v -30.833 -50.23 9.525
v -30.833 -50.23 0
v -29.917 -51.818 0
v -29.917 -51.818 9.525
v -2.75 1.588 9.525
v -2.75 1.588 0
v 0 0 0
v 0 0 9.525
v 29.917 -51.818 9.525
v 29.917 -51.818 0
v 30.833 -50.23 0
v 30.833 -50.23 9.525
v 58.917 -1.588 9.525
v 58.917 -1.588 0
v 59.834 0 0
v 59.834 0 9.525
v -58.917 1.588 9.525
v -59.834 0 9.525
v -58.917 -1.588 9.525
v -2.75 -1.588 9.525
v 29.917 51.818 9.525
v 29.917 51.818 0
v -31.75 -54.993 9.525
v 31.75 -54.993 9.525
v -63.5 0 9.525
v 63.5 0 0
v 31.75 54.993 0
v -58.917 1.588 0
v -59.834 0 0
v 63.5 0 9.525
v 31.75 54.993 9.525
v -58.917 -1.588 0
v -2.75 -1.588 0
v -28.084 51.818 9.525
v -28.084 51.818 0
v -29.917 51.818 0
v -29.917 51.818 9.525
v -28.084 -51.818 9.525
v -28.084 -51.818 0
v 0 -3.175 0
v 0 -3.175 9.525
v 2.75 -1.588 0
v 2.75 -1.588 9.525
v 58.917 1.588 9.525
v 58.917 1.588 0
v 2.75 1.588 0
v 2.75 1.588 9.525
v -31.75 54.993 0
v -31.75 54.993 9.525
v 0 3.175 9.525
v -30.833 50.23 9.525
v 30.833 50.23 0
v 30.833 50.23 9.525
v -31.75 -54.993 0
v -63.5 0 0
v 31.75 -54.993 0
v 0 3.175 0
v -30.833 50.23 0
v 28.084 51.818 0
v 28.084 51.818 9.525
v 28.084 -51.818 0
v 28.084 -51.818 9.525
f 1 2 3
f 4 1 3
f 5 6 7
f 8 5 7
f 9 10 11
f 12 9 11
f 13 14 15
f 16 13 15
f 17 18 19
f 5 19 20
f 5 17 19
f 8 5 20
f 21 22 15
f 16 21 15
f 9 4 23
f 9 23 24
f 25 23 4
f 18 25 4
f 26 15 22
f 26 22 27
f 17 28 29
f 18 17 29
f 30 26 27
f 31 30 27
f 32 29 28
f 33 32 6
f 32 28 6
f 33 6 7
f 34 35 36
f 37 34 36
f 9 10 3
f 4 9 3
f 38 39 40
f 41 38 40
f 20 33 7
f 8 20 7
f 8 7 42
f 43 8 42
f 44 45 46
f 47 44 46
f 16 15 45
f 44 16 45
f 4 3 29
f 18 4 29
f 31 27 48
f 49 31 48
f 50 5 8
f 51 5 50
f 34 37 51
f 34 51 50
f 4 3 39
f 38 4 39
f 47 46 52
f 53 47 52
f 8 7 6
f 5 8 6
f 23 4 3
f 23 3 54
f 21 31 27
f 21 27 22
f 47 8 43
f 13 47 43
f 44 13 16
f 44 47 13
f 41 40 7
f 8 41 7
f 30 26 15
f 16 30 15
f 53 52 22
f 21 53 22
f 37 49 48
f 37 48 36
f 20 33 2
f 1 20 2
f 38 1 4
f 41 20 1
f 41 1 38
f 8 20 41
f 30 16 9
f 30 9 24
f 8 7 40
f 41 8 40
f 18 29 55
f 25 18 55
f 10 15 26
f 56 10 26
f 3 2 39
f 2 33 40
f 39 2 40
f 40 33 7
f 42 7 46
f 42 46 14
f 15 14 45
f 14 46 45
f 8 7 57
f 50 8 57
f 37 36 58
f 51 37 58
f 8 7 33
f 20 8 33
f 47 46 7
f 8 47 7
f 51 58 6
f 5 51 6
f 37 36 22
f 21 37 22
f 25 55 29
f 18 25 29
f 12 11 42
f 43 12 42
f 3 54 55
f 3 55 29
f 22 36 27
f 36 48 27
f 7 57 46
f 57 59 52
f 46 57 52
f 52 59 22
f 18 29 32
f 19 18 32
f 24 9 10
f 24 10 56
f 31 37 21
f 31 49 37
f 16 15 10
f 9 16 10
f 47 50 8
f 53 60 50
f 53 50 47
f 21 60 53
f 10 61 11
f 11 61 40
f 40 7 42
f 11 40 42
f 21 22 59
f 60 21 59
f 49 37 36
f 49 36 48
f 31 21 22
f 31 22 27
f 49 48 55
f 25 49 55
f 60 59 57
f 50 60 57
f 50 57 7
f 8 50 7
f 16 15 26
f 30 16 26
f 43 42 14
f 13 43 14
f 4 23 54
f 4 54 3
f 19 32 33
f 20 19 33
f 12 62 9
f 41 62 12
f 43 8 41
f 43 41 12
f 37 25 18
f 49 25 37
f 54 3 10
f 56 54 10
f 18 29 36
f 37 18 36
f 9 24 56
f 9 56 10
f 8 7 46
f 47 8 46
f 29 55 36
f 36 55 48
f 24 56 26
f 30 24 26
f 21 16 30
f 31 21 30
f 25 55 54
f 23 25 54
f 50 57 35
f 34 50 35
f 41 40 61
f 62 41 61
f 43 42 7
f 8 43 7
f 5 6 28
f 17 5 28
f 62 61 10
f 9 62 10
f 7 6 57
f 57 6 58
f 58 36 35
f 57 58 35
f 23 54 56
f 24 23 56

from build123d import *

# Parameters (mm, degrees)
F1_DEPTH = 9.525
F2_DEPTH = 9.525
F4_DEPTH = 9.525
F5_DEPTH = 9.525
F6_DEPTH = 9.525


with BuildPart() as f1:
    # F0 (on Top) → F1 (new body)
    with BuildSketch(Plane.XY):
        Polygon((-59.833826, 0), (-29.916913, 51.817613), (-31.75, 54.992613), (-63.5, 0), align=None)
        Polygon((31.75, 54.992613), (29.916913, 51.817613), (59.833826, 0), (63.5, 0), align=None)
        Polygon((31.75, -54.992613), (29.916913, -51.817613), (-29.916913, -51.817613), (-31.75, -54.992613), align=None)
    extrude(amount=F1_DEPTH)


with BuildPart() as f2:
    # F0 (on Top) → F2 (new body)
    with BuildSketch(Plane.XY):
        Polygon((-29.916913, -51.817613), (-59.833826, 0), (-63.5, 0), (-31.75, -54.992613), align=None)
        Polygon((-29.916913, 51.817613), (29.916913, 51.817613), (31.75, 54.992613), (-31.75, 54.992613), align=None)
        Polygon((63.5, 0), (59.833826, 0), (29.916913, -51.817613), (31.75, -54.992613), align=None)
    extrude(amount=F2_DEPTH)


with BuildPart() as f4:
    # F3 (on Top) → F4 (new body)
    with BuildSketch(Plane.XY):
        Polygon((-29.916913, 51.817613), (-30.833456, 50.230113), (-2.749631, 1.5875), (0, 0), (0, 3.175), (-28.083826, 51.817613), align=None)
        Polygon((2.749631, -1.5875), (0, 0), (0, -3.175), (28.083826, -51.817613), (29.916913, -51.817613), (30.833456, -50.230113), align=None)
    extrude(amount=F4_DEPTH)


with BuildPart() as f5:
    # F3 (on Top) → F5 (new body)
    with BuildSketch(Plane.XY):
        Polygon((0, 0), (-2.749631, 1.5875), (-58.917282, 1.5875), (-59.833826, 0), (-58.917282, -1.5875), (-2.749631, -1.5875), align=None)
        Polygon((2.749631, 1.5875), (0, 0), (2.749631, -1.5875), (58.917282, -1.5875), (59.833826, 0), (58.917282, 1.5875), align=None)
    extrude(amount=F5_DEPTH)


with BuildPart() as f6:
    # F3 (on Top) → F6 (new body)
    with BuildSketch(Plane.XY):
        Polygon((0, 3.175), (0, 0), (2.749631, 1.5875), (30.833456, 50.230113), (29.916913, 51.817613), (28.083826, 51.817613), align=None)
        Polygon((0, -3.175), (0, 0), (-2.749631, -1.5875), (-30.833456, -50.230113), (-29.916913, -51.817613), (-28.083826, -51.817613), align=None)
    extrude(amount=F6_DEPTH)


solid = Compound([f1.part, f2.part, f4.part, f5.part, f6.part])
